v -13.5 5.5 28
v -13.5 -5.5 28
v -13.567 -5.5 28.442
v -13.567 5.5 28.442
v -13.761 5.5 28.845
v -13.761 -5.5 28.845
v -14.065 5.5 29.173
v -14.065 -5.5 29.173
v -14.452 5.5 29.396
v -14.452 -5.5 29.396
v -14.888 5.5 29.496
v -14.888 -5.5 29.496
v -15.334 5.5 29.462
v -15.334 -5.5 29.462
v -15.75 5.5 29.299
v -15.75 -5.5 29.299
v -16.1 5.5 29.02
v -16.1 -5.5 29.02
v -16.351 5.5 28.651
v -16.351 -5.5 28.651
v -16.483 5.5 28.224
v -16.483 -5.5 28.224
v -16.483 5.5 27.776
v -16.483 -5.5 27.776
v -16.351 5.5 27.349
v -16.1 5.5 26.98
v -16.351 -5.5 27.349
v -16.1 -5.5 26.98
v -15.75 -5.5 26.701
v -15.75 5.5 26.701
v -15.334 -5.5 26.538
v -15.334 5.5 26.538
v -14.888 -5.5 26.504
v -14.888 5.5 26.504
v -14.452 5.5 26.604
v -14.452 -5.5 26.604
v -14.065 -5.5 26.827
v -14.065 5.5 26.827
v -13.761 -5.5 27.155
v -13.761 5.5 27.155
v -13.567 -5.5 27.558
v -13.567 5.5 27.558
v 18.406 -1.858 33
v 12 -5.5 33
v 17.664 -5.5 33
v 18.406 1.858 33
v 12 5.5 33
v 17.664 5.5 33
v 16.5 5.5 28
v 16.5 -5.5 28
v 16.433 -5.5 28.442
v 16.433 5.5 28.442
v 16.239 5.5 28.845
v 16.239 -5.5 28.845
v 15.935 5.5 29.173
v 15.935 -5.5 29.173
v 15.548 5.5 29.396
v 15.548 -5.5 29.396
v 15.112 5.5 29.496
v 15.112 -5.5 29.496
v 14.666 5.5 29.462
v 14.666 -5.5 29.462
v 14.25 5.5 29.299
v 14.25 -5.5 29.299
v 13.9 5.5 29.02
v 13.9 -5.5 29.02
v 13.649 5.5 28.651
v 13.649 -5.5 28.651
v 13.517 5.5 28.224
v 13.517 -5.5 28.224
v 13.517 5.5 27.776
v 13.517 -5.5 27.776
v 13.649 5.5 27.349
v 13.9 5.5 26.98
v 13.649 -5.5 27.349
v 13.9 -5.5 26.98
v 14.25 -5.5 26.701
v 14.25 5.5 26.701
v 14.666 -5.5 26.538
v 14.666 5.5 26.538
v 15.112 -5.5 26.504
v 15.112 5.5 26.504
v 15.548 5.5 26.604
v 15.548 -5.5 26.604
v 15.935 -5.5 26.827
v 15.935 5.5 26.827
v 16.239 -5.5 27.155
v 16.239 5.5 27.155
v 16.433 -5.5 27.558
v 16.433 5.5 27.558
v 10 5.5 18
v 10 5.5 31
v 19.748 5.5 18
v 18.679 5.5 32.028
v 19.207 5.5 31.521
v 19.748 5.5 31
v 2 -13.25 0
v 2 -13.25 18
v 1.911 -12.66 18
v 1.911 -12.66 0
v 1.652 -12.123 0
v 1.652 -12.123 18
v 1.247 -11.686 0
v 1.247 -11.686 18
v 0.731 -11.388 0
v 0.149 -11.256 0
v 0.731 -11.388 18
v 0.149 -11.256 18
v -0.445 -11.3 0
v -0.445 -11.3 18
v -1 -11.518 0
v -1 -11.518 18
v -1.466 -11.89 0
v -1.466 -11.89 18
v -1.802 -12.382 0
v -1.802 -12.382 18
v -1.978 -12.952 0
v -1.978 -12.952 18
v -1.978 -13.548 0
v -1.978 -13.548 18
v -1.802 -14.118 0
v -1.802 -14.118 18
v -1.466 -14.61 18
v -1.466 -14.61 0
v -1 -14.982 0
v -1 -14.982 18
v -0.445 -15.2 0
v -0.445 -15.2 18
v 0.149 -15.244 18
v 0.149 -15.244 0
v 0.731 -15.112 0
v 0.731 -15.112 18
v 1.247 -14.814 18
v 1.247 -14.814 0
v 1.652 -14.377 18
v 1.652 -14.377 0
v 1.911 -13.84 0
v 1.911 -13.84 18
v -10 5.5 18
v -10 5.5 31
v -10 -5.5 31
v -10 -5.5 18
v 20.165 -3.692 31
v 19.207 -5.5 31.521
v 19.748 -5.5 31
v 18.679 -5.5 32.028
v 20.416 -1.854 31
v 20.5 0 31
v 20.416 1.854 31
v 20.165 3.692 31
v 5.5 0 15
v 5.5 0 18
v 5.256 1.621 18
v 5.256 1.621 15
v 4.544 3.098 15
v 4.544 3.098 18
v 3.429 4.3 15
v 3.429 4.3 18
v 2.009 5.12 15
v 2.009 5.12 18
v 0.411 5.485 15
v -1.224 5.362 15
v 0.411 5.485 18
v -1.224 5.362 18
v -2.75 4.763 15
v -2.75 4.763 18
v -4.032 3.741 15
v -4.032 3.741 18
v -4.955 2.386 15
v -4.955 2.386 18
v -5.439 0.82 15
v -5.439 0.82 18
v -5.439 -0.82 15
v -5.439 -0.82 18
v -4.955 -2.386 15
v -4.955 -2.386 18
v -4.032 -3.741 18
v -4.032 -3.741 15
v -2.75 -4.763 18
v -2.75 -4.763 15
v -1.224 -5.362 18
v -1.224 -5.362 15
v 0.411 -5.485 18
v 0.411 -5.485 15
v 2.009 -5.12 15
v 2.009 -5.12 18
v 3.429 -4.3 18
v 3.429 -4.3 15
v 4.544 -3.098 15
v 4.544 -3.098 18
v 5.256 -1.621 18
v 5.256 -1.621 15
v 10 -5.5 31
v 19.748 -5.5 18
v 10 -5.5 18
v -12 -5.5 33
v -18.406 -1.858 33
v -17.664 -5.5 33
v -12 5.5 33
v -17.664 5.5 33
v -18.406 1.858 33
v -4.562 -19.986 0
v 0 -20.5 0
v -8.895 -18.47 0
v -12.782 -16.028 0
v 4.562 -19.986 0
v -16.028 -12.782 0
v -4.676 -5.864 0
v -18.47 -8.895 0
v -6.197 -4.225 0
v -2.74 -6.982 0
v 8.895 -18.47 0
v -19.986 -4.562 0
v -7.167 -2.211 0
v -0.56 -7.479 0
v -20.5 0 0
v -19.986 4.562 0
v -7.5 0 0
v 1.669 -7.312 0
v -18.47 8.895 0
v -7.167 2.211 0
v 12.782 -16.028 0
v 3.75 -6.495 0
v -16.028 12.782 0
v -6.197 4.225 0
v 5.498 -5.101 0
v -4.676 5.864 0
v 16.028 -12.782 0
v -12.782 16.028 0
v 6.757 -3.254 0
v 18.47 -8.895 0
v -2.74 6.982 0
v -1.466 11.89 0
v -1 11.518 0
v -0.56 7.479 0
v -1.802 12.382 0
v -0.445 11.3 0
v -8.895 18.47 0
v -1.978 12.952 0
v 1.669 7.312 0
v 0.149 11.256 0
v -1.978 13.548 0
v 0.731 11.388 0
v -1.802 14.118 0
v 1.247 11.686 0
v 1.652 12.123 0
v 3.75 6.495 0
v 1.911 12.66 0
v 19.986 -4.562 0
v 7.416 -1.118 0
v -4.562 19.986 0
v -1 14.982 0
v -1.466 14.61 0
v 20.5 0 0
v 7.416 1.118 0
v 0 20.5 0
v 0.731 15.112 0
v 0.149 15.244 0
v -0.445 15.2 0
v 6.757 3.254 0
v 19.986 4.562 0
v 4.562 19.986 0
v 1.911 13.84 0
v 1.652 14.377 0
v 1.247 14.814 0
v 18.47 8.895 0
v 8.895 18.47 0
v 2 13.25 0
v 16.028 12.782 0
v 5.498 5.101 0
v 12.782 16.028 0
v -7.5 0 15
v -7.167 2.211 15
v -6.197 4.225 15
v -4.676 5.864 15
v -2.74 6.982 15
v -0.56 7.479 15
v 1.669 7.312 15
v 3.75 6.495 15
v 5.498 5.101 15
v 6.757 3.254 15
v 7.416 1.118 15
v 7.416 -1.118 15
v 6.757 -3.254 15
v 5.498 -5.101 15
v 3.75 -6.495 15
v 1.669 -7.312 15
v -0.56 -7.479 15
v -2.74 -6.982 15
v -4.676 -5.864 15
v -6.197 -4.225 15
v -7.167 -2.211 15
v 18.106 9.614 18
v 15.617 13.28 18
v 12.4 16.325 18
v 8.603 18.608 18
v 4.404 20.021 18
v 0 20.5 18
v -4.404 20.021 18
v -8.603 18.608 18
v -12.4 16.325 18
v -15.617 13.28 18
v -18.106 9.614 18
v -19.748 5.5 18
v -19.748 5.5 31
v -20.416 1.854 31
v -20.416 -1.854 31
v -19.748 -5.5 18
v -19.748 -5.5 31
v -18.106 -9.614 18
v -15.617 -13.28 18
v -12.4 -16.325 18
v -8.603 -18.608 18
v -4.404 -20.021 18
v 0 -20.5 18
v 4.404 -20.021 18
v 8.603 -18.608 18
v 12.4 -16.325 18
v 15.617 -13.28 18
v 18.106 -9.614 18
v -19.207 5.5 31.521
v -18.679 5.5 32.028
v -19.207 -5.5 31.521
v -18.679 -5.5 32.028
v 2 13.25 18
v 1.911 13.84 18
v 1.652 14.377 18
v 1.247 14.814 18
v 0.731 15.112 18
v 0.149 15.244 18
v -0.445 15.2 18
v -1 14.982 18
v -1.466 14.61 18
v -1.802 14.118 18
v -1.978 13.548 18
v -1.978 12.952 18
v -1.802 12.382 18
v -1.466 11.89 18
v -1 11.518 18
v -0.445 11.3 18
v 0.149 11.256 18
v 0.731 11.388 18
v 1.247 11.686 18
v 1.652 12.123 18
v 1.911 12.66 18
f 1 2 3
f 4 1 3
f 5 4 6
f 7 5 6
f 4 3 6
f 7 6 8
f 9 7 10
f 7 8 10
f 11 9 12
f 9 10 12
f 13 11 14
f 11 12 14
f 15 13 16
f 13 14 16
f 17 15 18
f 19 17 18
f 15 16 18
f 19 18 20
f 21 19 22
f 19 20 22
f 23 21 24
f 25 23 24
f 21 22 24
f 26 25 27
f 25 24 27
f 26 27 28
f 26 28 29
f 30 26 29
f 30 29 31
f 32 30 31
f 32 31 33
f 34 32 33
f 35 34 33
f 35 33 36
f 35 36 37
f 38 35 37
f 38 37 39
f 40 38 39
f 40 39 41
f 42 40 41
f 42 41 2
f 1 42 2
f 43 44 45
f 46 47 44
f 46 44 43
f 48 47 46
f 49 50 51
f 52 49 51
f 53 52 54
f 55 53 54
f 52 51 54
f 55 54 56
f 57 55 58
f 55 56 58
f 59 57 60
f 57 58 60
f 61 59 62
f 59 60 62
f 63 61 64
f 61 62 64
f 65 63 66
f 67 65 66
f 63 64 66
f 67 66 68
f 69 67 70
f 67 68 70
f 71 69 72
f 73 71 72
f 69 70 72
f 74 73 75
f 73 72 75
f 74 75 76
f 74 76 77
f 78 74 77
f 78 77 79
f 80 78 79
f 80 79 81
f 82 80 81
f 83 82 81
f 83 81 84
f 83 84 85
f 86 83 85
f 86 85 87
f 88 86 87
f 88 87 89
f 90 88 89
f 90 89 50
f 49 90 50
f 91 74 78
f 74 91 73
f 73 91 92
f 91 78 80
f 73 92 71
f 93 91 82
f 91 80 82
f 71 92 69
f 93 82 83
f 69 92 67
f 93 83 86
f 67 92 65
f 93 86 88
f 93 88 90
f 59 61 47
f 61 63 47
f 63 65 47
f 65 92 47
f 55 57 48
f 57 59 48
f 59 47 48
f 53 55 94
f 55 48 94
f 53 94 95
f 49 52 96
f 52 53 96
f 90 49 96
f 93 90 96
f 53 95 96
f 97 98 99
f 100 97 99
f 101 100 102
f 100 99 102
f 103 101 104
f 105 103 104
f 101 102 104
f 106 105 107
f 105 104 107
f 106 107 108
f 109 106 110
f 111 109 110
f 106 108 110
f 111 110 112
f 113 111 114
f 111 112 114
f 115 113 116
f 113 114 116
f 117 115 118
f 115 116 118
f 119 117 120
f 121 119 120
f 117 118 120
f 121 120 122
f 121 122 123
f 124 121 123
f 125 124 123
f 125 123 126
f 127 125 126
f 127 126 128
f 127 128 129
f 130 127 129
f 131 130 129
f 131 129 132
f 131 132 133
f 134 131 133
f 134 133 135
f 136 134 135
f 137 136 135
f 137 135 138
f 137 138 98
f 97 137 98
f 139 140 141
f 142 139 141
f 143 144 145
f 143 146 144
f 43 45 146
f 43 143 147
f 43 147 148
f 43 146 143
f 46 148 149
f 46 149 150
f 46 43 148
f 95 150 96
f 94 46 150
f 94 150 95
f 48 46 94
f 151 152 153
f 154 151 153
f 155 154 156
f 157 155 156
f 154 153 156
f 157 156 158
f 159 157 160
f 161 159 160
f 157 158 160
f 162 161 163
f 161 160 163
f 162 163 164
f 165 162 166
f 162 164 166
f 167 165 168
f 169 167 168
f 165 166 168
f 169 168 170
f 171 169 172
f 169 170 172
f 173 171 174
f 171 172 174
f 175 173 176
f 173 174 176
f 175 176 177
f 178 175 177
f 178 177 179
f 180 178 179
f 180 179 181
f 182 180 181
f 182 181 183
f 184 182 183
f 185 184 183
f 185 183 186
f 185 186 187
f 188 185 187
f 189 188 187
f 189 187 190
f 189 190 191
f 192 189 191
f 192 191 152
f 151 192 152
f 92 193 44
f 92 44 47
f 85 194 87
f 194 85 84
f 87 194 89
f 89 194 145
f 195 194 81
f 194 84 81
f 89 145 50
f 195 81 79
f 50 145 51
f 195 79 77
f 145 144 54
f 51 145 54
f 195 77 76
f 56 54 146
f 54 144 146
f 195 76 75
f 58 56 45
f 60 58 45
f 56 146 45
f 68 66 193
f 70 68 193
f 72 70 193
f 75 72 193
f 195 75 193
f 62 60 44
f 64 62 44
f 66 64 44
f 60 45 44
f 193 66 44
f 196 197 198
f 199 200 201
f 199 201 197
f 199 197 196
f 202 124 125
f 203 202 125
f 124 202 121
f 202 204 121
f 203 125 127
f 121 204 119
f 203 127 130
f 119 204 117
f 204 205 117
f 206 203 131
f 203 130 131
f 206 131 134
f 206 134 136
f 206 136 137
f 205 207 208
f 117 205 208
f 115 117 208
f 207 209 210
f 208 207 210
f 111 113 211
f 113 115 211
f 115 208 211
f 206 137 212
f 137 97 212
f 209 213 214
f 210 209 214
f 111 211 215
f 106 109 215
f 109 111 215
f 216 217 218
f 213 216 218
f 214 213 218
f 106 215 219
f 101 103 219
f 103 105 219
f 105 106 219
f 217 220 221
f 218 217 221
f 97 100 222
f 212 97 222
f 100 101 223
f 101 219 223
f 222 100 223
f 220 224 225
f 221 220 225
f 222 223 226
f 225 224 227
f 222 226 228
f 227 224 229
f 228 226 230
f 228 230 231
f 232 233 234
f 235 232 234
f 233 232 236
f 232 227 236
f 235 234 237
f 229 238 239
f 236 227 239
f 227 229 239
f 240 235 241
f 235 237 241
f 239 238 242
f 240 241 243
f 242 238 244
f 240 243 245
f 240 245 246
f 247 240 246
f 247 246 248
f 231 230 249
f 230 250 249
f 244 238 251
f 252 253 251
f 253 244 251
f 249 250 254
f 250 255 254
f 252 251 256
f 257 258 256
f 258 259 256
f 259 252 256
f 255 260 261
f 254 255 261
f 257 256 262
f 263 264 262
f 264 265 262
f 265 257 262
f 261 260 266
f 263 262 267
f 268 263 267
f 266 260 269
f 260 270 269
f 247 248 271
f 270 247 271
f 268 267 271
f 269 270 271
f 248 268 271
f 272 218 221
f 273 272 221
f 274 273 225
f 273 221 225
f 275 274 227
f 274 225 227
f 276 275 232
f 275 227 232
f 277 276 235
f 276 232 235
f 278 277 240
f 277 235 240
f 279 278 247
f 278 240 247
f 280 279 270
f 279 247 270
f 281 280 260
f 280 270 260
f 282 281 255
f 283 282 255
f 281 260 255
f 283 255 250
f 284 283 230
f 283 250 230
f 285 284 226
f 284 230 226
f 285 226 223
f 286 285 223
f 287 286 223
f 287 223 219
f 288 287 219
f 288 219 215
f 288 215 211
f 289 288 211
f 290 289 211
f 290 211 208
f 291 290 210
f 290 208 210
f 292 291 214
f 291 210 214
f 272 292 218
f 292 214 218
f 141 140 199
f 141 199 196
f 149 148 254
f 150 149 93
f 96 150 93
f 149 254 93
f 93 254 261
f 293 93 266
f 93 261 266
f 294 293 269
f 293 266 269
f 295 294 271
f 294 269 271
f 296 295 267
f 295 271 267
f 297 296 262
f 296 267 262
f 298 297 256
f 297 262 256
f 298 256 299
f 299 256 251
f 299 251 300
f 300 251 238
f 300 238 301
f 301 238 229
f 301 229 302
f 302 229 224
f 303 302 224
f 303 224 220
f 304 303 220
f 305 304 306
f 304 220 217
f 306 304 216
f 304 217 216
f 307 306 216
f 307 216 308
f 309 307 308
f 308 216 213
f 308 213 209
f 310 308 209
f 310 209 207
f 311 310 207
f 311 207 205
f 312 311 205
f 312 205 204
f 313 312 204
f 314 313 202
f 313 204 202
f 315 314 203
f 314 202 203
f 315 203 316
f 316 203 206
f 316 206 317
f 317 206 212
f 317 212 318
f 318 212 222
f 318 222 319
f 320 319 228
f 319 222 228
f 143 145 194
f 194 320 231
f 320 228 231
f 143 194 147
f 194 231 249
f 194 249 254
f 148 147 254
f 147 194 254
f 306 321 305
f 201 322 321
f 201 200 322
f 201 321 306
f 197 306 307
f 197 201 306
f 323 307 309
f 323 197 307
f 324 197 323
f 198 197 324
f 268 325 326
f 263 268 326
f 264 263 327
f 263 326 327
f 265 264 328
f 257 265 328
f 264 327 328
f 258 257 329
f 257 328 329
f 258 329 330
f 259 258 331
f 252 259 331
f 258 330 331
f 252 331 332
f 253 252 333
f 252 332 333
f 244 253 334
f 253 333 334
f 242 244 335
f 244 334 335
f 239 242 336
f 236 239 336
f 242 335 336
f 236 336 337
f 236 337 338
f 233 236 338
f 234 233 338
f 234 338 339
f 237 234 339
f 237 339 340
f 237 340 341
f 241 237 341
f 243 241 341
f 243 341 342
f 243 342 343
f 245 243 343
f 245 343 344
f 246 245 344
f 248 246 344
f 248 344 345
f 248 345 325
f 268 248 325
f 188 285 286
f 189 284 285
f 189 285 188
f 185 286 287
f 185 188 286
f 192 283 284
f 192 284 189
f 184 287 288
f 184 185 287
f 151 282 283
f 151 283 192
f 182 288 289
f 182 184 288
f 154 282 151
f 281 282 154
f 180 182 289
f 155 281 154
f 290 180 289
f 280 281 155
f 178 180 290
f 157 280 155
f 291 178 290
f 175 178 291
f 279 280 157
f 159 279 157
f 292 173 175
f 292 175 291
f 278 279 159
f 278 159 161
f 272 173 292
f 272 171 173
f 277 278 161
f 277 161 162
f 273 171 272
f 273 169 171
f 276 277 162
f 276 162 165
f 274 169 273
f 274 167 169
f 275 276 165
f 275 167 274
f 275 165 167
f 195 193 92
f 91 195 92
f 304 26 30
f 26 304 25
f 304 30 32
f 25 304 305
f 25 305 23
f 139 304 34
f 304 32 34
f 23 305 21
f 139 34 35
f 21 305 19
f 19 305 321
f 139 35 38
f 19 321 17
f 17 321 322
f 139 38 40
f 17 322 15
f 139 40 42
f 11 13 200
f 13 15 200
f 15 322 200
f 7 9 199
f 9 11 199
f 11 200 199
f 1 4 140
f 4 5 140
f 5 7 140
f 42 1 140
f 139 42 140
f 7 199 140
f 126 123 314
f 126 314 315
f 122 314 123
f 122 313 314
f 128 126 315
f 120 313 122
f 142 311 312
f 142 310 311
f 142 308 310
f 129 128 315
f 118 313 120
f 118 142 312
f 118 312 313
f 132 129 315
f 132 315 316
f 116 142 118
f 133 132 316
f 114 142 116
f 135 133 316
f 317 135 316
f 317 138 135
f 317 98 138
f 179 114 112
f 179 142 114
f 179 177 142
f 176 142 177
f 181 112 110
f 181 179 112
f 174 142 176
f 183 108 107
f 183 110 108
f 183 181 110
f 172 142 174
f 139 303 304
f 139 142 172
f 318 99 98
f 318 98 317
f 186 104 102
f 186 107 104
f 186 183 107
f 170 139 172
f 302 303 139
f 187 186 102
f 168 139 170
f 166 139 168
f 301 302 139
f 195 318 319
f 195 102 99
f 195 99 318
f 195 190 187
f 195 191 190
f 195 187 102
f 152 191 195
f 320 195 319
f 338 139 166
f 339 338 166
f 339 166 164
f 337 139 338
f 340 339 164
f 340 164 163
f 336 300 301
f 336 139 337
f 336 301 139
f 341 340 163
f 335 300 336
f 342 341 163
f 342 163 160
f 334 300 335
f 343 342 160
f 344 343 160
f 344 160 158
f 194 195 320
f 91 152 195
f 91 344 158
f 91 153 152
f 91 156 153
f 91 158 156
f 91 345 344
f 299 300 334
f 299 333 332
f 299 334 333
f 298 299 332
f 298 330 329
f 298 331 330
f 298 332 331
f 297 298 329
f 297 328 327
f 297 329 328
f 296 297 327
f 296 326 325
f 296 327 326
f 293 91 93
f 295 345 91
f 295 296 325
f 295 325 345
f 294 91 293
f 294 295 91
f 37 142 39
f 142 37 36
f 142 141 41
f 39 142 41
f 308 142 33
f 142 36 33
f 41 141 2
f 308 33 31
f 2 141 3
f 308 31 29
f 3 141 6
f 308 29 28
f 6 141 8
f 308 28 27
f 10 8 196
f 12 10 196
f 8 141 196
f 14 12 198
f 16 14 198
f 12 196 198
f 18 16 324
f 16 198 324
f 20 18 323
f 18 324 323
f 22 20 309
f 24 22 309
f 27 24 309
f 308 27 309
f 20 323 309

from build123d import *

# Parameters (mm, degrees)
SKETCH_1_R          = 20.5
EXTRUDE_1_DEPTH     = 33
CUT_EXTRUDE_1_DEPTH = 15
SKETCH_3_R          = 5
SKETCH_3_R_2        = 2
CUT_EXTRUDE_2_DEPTH = 35.124771062
CHAMFER_1_SIZE      = 2
SKETCH_4_R          = 1.5
CUT_EXTRUDE_3_DEPTH = 15
SKETCH_6_R          = 5.5
CUT_EXTRUDE_4_DEPTH = 35.124771062
SKETCH_9_R          = 7.5
CUT_EXTRUDE_7_DEPTH = 15


with BuildPart() as part:
    # Эскиз1 → Вытянуть1 (new body)
    with BuildSketch(Plane.XY):
        Circle(SKETCH_1_R)
    extrude(amount=EXTRUDE_1_DEPTH)

    # Эскиз2 → Вырез-Вытянуть1 (cut)
    with BuildSketch(Plane.XY.offset(33)):
        Polygon((10, 5.5), (24.402362137, 5.5), (24.402362137, 27.166317261), (-29.05675736, 27.166317261), (-29.05675736, 5.5), (-10, 5.5), (-10, -5.5), (-25.152295152, -5.5), (-25.152295152, -27.51572327), (25.537931669, -27.51572327), (25.537931669, -5.5), (10, -5.5), align=None)
    extrude(amount=-CUT_EXTRUDE_1_DEPTH, mode=Mode.SUBTRACT)

    # Эскиз3 → Вырез-Вытянуть2 (cut, through all)
    with BuildSketch(Plane.XY.offset(18)):
        Circle(SKETCH_3_R)
        with Locations((0, 13.25)):
            Circle(SKETCH_3_R_2)
        with Locations((0, -13.25)):
            Circle(SKETCH_3_R_2)
    extrude(amount=-CUT_EXTRUDE_2_DEPTH, mode=Mode.SUBTRACT)

    # Фаска1
    chamfer_1_edges = [part.edges().sort_by_distance(p)[0] for p in [
        (-10, 0, 33),
        (10, 0, 33),
        (-20.5, 0, 33),
        (20.311235339, -2.775557422, 33),
    ]]
    chamfer(chamfer_1_edges, length=CHAMFER_1_SIZE)

    # Эскиз4 → Вырез-Вытянуть3 (cut)
    with BuildSketch(Plane.XZ.offset(5.5)):
        with Locations((-15, 28)):
            Circle(SKETCH_4_R)
        with Locations((15, 28)):
            Circle(SKETCH_4_R)
    extrude(amount=-CUT_EXTRUDE_3_DEPTH, mode=Mode.SUBTRACT)

    # Эскиз6 → Вырез-Вытянуть4 (cut, through all)
    with BuildSketch(Plane.XY.offset(18)):
        Circle(SKETCH_6_R)
    extrude(amount=-CUT_EXTRUDE_4_DEPTH, mode=Mode.SUBTRACT)

    # Эскиз9 → Вырез-Вытянуть7 (cut)
    with BuildSketch(Plane(origin=(0, 0, 0), x_dir=(-1, 0, 0), z_dir=(0, 0, -1))):
        Circle(SKETCH_9_R)
    extrude(amount=-CUT_EXTRUDE_7_DEPTH, mode=Mode.SUBTRACT)


solid = part.part
